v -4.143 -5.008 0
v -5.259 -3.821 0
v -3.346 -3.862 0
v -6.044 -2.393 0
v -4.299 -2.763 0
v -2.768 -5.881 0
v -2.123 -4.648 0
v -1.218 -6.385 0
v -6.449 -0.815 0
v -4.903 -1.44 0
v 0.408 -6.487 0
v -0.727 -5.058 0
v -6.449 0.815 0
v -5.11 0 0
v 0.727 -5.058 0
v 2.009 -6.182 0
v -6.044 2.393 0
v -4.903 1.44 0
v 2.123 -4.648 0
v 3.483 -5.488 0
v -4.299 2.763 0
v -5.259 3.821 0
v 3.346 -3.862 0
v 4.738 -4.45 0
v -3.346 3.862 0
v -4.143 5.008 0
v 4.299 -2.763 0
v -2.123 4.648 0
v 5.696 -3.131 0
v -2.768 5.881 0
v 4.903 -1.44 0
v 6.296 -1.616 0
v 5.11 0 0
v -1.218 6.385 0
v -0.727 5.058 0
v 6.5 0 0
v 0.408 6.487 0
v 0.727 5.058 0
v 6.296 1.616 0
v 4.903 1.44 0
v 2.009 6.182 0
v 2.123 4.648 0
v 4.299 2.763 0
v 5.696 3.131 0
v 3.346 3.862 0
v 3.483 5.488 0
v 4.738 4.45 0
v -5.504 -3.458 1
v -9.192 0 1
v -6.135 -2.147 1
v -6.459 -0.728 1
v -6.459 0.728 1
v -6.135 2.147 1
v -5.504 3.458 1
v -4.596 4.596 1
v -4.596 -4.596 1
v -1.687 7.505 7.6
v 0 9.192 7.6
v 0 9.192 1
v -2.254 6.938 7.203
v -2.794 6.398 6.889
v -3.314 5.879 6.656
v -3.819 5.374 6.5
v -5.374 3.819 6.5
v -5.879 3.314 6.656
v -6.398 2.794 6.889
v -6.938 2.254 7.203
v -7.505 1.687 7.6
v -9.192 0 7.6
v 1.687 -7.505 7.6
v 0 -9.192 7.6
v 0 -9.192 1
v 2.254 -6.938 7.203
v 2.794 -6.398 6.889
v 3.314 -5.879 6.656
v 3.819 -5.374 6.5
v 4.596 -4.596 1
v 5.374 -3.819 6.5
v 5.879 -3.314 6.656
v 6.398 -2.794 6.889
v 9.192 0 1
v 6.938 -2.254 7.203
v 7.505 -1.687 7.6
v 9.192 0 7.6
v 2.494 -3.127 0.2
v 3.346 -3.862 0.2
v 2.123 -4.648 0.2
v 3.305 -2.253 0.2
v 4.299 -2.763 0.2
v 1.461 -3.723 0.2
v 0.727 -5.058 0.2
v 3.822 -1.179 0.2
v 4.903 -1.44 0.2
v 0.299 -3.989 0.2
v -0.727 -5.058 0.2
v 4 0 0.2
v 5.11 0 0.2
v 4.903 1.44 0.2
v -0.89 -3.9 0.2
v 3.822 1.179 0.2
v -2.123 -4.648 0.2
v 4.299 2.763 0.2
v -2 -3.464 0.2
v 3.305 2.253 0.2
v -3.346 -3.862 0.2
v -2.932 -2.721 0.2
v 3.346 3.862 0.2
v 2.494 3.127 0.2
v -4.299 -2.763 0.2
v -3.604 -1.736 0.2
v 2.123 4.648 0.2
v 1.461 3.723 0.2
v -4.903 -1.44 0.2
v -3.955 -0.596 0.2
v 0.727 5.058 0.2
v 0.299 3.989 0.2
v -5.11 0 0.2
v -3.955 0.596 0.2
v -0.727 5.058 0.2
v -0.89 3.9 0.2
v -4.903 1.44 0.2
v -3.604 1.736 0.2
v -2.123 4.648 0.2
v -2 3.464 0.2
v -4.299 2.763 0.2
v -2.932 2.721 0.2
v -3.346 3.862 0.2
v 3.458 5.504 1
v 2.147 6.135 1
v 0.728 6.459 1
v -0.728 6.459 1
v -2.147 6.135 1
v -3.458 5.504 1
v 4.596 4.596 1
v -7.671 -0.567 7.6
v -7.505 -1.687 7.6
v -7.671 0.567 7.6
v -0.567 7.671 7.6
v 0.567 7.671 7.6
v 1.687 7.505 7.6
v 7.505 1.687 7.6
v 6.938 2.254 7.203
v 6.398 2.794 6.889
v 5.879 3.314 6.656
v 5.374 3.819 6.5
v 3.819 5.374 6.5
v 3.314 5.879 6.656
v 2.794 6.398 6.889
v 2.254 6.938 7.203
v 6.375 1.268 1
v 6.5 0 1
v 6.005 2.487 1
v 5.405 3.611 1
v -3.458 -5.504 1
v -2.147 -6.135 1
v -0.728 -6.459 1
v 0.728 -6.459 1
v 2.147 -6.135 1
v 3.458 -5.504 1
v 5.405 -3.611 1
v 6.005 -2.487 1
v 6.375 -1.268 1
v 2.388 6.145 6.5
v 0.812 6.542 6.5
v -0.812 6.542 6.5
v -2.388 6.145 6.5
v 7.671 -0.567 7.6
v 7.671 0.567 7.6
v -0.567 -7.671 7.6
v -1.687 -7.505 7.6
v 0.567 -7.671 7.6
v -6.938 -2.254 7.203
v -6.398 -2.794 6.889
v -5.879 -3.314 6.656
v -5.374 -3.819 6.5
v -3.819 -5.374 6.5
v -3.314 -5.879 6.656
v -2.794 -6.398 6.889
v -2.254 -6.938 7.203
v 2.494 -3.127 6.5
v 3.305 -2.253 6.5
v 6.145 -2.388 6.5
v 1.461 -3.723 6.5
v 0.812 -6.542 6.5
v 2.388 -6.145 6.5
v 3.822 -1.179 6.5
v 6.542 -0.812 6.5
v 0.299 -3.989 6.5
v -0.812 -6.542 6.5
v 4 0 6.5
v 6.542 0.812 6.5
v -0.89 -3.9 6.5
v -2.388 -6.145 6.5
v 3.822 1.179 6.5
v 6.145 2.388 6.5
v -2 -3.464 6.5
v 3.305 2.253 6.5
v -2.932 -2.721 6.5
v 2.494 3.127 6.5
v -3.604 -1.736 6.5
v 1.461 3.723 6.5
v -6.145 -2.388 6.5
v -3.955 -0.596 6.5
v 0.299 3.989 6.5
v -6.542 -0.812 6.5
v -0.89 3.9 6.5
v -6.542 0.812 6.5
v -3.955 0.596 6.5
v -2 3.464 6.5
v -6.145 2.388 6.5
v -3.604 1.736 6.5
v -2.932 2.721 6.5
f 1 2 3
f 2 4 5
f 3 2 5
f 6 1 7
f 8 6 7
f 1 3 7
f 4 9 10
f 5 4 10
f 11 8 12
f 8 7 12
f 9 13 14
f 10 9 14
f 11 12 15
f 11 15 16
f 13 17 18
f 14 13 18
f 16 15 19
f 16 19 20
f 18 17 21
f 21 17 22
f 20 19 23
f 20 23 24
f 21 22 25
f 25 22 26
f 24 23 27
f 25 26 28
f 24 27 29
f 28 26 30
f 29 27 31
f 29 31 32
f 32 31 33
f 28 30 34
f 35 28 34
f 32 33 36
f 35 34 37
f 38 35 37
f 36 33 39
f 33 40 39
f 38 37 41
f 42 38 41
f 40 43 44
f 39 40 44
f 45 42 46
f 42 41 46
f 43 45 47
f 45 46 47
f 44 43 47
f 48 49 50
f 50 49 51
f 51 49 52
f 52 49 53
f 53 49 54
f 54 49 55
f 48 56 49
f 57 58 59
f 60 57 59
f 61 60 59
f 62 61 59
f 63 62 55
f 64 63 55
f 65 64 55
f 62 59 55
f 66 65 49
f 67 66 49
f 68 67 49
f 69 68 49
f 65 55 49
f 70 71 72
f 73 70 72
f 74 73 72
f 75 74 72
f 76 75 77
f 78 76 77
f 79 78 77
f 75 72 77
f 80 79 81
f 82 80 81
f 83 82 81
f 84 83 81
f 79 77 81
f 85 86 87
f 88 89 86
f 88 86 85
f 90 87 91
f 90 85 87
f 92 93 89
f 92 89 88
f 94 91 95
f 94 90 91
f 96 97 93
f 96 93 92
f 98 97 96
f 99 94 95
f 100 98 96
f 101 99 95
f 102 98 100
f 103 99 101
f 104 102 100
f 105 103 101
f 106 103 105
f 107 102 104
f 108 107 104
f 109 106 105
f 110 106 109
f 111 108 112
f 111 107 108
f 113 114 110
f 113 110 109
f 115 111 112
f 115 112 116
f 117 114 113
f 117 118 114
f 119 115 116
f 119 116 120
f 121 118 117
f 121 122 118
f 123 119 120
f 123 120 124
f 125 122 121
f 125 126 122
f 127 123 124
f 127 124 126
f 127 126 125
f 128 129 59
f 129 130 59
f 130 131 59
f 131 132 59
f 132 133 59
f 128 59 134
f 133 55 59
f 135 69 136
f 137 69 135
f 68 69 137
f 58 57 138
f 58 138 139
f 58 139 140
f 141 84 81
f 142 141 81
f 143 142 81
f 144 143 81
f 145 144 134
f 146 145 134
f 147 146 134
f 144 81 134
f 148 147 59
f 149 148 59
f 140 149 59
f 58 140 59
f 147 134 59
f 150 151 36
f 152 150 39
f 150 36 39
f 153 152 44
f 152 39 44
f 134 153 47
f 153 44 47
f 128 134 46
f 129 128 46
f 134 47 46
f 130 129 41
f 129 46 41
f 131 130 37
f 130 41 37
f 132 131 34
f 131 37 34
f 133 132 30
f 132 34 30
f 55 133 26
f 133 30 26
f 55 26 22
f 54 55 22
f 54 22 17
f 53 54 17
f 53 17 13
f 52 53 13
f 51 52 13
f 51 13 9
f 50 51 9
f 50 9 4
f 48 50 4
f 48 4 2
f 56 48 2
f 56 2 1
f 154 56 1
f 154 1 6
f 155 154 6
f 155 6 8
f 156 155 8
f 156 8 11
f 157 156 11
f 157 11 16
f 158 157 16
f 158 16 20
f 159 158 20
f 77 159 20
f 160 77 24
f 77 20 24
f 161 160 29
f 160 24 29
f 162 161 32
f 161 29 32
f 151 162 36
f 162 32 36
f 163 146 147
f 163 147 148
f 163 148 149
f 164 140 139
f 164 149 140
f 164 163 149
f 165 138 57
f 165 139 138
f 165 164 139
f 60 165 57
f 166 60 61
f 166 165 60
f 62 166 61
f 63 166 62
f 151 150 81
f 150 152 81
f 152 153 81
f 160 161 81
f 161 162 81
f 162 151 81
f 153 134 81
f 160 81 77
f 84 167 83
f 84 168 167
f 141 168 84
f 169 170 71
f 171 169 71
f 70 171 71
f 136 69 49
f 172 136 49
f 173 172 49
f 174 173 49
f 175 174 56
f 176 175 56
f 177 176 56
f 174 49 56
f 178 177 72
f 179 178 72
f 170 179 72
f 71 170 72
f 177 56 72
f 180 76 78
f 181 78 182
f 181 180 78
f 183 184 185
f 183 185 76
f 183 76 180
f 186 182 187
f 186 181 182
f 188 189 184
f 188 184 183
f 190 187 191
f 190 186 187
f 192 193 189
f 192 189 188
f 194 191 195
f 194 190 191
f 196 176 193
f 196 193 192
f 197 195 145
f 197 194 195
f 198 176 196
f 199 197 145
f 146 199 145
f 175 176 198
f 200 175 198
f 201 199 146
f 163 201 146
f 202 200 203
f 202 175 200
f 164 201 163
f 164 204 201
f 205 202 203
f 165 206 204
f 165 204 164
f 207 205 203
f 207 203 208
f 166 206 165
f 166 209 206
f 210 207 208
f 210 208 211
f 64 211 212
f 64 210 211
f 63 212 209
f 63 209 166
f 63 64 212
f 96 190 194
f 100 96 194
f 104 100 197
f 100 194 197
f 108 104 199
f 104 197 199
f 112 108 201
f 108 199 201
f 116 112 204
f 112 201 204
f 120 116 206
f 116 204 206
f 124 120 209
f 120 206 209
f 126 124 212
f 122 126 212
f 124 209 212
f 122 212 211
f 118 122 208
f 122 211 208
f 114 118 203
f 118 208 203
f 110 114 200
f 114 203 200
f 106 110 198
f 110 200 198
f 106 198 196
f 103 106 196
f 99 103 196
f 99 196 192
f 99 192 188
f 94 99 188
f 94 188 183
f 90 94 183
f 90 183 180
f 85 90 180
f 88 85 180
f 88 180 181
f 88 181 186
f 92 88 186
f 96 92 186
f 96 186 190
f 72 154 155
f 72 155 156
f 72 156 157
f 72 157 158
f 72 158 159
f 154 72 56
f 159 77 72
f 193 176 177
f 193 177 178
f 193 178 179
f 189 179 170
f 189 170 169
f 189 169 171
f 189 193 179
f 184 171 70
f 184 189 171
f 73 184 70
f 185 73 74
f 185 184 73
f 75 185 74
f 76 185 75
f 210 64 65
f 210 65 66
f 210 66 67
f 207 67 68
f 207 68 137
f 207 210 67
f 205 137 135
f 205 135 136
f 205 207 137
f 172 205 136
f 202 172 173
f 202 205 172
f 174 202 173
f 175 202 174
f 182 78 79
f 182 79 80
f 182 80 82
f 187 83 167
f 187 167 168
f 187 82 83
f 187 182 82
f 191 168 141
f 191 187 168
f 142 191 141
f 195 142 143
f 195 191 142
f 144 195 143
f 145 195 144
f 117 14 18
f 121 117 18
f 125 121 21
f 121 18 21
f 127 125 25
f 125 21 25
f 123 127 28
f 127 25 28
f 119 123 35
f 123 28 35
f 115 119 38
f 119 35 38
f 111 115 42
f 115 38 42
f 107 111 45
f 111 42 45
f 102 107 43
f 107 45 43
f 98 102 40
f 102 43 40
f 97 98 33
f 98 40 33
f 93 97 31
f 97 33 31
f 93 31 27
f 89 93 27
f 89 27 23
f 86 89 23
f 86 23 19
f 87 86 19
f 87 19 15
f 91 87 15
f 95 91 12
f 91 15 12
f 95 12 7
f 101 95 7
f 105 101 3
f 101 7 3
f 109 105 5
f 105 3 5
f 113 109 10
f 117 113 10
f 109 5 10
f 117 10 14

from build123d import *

# Parameters (mm, degrees)
SKETCH_1_R          = 6.5
EXTRUDE_1_DEPTH     = 1
EXTRUDE_2_DEPTH     = 5.5
EXTRUDE_3_DEPTH     = 1.1
SKETCH_5_R          = 4
CUT_EXTRUDE_1_DEPTH = 7.5
SKETCH_6_R          = 5.11
CUT_EXTRUDE_2_DEPTH = 0.2


with BuildPart() as part:
    # 草图1 → 拉伸1 (new body)
    with BuildSketch(Plane.XY):
        Circle(SKETCH_1_R)
    extrude(amount=EXTRUDE_1_DEPTH)

    # 草图2 → 拉伸2 (add)
    with BuildSketch(Plane.XY.offset(1)):
        Polygon((0, 9.192388155), (-9.192388155, 0), (0, -9.192388155), (9.192388155, 0), align=None)
    extrude(amount=EXTRUDE_2_DEPTH)

    # 草图3 → 拉伸3 (add)
    with BuildSketch(Plane.XY.offset(6.5)):
        Polygon((9.192388155, 0), (0, 9.192388155), (-9.192388155, 0), (0, -9.192388155), align=None)
    extrude(amount=EXTRUDE_3_DEPTH)

    # 草图4 → 切除-旋转1 (revolve, cut)
    with BuildSketch(Plane(origin=(0, 0, 0), x_dir=(0, 0, -1), z_dir=(1, 0, 0))):
        Polygon((-6.5, 6.592388155), (-6.5, 0), (-7.6, 0), (-7.6, 7.692388155), align=None)
    revolve(axis=Axis((0, 0, 0), (0, 0, 1)), mode=Mode.SUBTRACT)

    # 草图5 → 切除-拉伸1 (cut, through all)
    with BuildSketch(Plane.XY.offset(6.5)):
        Circle(SKETCH_5_R)
    extrude(amount=-CUT_EXTRUDE_1_DEPTH, mode=Mode.SUBTRACT)

    # 草图6 → 切除-拉伸2 (cut)
    with BuildSketch(Plane(origin=(0, 0, 0), x_dir=(-1, 0, 0), z_dir=(0, 0, -1))):
        Circle(SKETCH_6_R)
    extrude(amount=-CUT_EXTRUDE_2_DEPTH, mode=Mode.SUBTRACT)


solid = part.part
